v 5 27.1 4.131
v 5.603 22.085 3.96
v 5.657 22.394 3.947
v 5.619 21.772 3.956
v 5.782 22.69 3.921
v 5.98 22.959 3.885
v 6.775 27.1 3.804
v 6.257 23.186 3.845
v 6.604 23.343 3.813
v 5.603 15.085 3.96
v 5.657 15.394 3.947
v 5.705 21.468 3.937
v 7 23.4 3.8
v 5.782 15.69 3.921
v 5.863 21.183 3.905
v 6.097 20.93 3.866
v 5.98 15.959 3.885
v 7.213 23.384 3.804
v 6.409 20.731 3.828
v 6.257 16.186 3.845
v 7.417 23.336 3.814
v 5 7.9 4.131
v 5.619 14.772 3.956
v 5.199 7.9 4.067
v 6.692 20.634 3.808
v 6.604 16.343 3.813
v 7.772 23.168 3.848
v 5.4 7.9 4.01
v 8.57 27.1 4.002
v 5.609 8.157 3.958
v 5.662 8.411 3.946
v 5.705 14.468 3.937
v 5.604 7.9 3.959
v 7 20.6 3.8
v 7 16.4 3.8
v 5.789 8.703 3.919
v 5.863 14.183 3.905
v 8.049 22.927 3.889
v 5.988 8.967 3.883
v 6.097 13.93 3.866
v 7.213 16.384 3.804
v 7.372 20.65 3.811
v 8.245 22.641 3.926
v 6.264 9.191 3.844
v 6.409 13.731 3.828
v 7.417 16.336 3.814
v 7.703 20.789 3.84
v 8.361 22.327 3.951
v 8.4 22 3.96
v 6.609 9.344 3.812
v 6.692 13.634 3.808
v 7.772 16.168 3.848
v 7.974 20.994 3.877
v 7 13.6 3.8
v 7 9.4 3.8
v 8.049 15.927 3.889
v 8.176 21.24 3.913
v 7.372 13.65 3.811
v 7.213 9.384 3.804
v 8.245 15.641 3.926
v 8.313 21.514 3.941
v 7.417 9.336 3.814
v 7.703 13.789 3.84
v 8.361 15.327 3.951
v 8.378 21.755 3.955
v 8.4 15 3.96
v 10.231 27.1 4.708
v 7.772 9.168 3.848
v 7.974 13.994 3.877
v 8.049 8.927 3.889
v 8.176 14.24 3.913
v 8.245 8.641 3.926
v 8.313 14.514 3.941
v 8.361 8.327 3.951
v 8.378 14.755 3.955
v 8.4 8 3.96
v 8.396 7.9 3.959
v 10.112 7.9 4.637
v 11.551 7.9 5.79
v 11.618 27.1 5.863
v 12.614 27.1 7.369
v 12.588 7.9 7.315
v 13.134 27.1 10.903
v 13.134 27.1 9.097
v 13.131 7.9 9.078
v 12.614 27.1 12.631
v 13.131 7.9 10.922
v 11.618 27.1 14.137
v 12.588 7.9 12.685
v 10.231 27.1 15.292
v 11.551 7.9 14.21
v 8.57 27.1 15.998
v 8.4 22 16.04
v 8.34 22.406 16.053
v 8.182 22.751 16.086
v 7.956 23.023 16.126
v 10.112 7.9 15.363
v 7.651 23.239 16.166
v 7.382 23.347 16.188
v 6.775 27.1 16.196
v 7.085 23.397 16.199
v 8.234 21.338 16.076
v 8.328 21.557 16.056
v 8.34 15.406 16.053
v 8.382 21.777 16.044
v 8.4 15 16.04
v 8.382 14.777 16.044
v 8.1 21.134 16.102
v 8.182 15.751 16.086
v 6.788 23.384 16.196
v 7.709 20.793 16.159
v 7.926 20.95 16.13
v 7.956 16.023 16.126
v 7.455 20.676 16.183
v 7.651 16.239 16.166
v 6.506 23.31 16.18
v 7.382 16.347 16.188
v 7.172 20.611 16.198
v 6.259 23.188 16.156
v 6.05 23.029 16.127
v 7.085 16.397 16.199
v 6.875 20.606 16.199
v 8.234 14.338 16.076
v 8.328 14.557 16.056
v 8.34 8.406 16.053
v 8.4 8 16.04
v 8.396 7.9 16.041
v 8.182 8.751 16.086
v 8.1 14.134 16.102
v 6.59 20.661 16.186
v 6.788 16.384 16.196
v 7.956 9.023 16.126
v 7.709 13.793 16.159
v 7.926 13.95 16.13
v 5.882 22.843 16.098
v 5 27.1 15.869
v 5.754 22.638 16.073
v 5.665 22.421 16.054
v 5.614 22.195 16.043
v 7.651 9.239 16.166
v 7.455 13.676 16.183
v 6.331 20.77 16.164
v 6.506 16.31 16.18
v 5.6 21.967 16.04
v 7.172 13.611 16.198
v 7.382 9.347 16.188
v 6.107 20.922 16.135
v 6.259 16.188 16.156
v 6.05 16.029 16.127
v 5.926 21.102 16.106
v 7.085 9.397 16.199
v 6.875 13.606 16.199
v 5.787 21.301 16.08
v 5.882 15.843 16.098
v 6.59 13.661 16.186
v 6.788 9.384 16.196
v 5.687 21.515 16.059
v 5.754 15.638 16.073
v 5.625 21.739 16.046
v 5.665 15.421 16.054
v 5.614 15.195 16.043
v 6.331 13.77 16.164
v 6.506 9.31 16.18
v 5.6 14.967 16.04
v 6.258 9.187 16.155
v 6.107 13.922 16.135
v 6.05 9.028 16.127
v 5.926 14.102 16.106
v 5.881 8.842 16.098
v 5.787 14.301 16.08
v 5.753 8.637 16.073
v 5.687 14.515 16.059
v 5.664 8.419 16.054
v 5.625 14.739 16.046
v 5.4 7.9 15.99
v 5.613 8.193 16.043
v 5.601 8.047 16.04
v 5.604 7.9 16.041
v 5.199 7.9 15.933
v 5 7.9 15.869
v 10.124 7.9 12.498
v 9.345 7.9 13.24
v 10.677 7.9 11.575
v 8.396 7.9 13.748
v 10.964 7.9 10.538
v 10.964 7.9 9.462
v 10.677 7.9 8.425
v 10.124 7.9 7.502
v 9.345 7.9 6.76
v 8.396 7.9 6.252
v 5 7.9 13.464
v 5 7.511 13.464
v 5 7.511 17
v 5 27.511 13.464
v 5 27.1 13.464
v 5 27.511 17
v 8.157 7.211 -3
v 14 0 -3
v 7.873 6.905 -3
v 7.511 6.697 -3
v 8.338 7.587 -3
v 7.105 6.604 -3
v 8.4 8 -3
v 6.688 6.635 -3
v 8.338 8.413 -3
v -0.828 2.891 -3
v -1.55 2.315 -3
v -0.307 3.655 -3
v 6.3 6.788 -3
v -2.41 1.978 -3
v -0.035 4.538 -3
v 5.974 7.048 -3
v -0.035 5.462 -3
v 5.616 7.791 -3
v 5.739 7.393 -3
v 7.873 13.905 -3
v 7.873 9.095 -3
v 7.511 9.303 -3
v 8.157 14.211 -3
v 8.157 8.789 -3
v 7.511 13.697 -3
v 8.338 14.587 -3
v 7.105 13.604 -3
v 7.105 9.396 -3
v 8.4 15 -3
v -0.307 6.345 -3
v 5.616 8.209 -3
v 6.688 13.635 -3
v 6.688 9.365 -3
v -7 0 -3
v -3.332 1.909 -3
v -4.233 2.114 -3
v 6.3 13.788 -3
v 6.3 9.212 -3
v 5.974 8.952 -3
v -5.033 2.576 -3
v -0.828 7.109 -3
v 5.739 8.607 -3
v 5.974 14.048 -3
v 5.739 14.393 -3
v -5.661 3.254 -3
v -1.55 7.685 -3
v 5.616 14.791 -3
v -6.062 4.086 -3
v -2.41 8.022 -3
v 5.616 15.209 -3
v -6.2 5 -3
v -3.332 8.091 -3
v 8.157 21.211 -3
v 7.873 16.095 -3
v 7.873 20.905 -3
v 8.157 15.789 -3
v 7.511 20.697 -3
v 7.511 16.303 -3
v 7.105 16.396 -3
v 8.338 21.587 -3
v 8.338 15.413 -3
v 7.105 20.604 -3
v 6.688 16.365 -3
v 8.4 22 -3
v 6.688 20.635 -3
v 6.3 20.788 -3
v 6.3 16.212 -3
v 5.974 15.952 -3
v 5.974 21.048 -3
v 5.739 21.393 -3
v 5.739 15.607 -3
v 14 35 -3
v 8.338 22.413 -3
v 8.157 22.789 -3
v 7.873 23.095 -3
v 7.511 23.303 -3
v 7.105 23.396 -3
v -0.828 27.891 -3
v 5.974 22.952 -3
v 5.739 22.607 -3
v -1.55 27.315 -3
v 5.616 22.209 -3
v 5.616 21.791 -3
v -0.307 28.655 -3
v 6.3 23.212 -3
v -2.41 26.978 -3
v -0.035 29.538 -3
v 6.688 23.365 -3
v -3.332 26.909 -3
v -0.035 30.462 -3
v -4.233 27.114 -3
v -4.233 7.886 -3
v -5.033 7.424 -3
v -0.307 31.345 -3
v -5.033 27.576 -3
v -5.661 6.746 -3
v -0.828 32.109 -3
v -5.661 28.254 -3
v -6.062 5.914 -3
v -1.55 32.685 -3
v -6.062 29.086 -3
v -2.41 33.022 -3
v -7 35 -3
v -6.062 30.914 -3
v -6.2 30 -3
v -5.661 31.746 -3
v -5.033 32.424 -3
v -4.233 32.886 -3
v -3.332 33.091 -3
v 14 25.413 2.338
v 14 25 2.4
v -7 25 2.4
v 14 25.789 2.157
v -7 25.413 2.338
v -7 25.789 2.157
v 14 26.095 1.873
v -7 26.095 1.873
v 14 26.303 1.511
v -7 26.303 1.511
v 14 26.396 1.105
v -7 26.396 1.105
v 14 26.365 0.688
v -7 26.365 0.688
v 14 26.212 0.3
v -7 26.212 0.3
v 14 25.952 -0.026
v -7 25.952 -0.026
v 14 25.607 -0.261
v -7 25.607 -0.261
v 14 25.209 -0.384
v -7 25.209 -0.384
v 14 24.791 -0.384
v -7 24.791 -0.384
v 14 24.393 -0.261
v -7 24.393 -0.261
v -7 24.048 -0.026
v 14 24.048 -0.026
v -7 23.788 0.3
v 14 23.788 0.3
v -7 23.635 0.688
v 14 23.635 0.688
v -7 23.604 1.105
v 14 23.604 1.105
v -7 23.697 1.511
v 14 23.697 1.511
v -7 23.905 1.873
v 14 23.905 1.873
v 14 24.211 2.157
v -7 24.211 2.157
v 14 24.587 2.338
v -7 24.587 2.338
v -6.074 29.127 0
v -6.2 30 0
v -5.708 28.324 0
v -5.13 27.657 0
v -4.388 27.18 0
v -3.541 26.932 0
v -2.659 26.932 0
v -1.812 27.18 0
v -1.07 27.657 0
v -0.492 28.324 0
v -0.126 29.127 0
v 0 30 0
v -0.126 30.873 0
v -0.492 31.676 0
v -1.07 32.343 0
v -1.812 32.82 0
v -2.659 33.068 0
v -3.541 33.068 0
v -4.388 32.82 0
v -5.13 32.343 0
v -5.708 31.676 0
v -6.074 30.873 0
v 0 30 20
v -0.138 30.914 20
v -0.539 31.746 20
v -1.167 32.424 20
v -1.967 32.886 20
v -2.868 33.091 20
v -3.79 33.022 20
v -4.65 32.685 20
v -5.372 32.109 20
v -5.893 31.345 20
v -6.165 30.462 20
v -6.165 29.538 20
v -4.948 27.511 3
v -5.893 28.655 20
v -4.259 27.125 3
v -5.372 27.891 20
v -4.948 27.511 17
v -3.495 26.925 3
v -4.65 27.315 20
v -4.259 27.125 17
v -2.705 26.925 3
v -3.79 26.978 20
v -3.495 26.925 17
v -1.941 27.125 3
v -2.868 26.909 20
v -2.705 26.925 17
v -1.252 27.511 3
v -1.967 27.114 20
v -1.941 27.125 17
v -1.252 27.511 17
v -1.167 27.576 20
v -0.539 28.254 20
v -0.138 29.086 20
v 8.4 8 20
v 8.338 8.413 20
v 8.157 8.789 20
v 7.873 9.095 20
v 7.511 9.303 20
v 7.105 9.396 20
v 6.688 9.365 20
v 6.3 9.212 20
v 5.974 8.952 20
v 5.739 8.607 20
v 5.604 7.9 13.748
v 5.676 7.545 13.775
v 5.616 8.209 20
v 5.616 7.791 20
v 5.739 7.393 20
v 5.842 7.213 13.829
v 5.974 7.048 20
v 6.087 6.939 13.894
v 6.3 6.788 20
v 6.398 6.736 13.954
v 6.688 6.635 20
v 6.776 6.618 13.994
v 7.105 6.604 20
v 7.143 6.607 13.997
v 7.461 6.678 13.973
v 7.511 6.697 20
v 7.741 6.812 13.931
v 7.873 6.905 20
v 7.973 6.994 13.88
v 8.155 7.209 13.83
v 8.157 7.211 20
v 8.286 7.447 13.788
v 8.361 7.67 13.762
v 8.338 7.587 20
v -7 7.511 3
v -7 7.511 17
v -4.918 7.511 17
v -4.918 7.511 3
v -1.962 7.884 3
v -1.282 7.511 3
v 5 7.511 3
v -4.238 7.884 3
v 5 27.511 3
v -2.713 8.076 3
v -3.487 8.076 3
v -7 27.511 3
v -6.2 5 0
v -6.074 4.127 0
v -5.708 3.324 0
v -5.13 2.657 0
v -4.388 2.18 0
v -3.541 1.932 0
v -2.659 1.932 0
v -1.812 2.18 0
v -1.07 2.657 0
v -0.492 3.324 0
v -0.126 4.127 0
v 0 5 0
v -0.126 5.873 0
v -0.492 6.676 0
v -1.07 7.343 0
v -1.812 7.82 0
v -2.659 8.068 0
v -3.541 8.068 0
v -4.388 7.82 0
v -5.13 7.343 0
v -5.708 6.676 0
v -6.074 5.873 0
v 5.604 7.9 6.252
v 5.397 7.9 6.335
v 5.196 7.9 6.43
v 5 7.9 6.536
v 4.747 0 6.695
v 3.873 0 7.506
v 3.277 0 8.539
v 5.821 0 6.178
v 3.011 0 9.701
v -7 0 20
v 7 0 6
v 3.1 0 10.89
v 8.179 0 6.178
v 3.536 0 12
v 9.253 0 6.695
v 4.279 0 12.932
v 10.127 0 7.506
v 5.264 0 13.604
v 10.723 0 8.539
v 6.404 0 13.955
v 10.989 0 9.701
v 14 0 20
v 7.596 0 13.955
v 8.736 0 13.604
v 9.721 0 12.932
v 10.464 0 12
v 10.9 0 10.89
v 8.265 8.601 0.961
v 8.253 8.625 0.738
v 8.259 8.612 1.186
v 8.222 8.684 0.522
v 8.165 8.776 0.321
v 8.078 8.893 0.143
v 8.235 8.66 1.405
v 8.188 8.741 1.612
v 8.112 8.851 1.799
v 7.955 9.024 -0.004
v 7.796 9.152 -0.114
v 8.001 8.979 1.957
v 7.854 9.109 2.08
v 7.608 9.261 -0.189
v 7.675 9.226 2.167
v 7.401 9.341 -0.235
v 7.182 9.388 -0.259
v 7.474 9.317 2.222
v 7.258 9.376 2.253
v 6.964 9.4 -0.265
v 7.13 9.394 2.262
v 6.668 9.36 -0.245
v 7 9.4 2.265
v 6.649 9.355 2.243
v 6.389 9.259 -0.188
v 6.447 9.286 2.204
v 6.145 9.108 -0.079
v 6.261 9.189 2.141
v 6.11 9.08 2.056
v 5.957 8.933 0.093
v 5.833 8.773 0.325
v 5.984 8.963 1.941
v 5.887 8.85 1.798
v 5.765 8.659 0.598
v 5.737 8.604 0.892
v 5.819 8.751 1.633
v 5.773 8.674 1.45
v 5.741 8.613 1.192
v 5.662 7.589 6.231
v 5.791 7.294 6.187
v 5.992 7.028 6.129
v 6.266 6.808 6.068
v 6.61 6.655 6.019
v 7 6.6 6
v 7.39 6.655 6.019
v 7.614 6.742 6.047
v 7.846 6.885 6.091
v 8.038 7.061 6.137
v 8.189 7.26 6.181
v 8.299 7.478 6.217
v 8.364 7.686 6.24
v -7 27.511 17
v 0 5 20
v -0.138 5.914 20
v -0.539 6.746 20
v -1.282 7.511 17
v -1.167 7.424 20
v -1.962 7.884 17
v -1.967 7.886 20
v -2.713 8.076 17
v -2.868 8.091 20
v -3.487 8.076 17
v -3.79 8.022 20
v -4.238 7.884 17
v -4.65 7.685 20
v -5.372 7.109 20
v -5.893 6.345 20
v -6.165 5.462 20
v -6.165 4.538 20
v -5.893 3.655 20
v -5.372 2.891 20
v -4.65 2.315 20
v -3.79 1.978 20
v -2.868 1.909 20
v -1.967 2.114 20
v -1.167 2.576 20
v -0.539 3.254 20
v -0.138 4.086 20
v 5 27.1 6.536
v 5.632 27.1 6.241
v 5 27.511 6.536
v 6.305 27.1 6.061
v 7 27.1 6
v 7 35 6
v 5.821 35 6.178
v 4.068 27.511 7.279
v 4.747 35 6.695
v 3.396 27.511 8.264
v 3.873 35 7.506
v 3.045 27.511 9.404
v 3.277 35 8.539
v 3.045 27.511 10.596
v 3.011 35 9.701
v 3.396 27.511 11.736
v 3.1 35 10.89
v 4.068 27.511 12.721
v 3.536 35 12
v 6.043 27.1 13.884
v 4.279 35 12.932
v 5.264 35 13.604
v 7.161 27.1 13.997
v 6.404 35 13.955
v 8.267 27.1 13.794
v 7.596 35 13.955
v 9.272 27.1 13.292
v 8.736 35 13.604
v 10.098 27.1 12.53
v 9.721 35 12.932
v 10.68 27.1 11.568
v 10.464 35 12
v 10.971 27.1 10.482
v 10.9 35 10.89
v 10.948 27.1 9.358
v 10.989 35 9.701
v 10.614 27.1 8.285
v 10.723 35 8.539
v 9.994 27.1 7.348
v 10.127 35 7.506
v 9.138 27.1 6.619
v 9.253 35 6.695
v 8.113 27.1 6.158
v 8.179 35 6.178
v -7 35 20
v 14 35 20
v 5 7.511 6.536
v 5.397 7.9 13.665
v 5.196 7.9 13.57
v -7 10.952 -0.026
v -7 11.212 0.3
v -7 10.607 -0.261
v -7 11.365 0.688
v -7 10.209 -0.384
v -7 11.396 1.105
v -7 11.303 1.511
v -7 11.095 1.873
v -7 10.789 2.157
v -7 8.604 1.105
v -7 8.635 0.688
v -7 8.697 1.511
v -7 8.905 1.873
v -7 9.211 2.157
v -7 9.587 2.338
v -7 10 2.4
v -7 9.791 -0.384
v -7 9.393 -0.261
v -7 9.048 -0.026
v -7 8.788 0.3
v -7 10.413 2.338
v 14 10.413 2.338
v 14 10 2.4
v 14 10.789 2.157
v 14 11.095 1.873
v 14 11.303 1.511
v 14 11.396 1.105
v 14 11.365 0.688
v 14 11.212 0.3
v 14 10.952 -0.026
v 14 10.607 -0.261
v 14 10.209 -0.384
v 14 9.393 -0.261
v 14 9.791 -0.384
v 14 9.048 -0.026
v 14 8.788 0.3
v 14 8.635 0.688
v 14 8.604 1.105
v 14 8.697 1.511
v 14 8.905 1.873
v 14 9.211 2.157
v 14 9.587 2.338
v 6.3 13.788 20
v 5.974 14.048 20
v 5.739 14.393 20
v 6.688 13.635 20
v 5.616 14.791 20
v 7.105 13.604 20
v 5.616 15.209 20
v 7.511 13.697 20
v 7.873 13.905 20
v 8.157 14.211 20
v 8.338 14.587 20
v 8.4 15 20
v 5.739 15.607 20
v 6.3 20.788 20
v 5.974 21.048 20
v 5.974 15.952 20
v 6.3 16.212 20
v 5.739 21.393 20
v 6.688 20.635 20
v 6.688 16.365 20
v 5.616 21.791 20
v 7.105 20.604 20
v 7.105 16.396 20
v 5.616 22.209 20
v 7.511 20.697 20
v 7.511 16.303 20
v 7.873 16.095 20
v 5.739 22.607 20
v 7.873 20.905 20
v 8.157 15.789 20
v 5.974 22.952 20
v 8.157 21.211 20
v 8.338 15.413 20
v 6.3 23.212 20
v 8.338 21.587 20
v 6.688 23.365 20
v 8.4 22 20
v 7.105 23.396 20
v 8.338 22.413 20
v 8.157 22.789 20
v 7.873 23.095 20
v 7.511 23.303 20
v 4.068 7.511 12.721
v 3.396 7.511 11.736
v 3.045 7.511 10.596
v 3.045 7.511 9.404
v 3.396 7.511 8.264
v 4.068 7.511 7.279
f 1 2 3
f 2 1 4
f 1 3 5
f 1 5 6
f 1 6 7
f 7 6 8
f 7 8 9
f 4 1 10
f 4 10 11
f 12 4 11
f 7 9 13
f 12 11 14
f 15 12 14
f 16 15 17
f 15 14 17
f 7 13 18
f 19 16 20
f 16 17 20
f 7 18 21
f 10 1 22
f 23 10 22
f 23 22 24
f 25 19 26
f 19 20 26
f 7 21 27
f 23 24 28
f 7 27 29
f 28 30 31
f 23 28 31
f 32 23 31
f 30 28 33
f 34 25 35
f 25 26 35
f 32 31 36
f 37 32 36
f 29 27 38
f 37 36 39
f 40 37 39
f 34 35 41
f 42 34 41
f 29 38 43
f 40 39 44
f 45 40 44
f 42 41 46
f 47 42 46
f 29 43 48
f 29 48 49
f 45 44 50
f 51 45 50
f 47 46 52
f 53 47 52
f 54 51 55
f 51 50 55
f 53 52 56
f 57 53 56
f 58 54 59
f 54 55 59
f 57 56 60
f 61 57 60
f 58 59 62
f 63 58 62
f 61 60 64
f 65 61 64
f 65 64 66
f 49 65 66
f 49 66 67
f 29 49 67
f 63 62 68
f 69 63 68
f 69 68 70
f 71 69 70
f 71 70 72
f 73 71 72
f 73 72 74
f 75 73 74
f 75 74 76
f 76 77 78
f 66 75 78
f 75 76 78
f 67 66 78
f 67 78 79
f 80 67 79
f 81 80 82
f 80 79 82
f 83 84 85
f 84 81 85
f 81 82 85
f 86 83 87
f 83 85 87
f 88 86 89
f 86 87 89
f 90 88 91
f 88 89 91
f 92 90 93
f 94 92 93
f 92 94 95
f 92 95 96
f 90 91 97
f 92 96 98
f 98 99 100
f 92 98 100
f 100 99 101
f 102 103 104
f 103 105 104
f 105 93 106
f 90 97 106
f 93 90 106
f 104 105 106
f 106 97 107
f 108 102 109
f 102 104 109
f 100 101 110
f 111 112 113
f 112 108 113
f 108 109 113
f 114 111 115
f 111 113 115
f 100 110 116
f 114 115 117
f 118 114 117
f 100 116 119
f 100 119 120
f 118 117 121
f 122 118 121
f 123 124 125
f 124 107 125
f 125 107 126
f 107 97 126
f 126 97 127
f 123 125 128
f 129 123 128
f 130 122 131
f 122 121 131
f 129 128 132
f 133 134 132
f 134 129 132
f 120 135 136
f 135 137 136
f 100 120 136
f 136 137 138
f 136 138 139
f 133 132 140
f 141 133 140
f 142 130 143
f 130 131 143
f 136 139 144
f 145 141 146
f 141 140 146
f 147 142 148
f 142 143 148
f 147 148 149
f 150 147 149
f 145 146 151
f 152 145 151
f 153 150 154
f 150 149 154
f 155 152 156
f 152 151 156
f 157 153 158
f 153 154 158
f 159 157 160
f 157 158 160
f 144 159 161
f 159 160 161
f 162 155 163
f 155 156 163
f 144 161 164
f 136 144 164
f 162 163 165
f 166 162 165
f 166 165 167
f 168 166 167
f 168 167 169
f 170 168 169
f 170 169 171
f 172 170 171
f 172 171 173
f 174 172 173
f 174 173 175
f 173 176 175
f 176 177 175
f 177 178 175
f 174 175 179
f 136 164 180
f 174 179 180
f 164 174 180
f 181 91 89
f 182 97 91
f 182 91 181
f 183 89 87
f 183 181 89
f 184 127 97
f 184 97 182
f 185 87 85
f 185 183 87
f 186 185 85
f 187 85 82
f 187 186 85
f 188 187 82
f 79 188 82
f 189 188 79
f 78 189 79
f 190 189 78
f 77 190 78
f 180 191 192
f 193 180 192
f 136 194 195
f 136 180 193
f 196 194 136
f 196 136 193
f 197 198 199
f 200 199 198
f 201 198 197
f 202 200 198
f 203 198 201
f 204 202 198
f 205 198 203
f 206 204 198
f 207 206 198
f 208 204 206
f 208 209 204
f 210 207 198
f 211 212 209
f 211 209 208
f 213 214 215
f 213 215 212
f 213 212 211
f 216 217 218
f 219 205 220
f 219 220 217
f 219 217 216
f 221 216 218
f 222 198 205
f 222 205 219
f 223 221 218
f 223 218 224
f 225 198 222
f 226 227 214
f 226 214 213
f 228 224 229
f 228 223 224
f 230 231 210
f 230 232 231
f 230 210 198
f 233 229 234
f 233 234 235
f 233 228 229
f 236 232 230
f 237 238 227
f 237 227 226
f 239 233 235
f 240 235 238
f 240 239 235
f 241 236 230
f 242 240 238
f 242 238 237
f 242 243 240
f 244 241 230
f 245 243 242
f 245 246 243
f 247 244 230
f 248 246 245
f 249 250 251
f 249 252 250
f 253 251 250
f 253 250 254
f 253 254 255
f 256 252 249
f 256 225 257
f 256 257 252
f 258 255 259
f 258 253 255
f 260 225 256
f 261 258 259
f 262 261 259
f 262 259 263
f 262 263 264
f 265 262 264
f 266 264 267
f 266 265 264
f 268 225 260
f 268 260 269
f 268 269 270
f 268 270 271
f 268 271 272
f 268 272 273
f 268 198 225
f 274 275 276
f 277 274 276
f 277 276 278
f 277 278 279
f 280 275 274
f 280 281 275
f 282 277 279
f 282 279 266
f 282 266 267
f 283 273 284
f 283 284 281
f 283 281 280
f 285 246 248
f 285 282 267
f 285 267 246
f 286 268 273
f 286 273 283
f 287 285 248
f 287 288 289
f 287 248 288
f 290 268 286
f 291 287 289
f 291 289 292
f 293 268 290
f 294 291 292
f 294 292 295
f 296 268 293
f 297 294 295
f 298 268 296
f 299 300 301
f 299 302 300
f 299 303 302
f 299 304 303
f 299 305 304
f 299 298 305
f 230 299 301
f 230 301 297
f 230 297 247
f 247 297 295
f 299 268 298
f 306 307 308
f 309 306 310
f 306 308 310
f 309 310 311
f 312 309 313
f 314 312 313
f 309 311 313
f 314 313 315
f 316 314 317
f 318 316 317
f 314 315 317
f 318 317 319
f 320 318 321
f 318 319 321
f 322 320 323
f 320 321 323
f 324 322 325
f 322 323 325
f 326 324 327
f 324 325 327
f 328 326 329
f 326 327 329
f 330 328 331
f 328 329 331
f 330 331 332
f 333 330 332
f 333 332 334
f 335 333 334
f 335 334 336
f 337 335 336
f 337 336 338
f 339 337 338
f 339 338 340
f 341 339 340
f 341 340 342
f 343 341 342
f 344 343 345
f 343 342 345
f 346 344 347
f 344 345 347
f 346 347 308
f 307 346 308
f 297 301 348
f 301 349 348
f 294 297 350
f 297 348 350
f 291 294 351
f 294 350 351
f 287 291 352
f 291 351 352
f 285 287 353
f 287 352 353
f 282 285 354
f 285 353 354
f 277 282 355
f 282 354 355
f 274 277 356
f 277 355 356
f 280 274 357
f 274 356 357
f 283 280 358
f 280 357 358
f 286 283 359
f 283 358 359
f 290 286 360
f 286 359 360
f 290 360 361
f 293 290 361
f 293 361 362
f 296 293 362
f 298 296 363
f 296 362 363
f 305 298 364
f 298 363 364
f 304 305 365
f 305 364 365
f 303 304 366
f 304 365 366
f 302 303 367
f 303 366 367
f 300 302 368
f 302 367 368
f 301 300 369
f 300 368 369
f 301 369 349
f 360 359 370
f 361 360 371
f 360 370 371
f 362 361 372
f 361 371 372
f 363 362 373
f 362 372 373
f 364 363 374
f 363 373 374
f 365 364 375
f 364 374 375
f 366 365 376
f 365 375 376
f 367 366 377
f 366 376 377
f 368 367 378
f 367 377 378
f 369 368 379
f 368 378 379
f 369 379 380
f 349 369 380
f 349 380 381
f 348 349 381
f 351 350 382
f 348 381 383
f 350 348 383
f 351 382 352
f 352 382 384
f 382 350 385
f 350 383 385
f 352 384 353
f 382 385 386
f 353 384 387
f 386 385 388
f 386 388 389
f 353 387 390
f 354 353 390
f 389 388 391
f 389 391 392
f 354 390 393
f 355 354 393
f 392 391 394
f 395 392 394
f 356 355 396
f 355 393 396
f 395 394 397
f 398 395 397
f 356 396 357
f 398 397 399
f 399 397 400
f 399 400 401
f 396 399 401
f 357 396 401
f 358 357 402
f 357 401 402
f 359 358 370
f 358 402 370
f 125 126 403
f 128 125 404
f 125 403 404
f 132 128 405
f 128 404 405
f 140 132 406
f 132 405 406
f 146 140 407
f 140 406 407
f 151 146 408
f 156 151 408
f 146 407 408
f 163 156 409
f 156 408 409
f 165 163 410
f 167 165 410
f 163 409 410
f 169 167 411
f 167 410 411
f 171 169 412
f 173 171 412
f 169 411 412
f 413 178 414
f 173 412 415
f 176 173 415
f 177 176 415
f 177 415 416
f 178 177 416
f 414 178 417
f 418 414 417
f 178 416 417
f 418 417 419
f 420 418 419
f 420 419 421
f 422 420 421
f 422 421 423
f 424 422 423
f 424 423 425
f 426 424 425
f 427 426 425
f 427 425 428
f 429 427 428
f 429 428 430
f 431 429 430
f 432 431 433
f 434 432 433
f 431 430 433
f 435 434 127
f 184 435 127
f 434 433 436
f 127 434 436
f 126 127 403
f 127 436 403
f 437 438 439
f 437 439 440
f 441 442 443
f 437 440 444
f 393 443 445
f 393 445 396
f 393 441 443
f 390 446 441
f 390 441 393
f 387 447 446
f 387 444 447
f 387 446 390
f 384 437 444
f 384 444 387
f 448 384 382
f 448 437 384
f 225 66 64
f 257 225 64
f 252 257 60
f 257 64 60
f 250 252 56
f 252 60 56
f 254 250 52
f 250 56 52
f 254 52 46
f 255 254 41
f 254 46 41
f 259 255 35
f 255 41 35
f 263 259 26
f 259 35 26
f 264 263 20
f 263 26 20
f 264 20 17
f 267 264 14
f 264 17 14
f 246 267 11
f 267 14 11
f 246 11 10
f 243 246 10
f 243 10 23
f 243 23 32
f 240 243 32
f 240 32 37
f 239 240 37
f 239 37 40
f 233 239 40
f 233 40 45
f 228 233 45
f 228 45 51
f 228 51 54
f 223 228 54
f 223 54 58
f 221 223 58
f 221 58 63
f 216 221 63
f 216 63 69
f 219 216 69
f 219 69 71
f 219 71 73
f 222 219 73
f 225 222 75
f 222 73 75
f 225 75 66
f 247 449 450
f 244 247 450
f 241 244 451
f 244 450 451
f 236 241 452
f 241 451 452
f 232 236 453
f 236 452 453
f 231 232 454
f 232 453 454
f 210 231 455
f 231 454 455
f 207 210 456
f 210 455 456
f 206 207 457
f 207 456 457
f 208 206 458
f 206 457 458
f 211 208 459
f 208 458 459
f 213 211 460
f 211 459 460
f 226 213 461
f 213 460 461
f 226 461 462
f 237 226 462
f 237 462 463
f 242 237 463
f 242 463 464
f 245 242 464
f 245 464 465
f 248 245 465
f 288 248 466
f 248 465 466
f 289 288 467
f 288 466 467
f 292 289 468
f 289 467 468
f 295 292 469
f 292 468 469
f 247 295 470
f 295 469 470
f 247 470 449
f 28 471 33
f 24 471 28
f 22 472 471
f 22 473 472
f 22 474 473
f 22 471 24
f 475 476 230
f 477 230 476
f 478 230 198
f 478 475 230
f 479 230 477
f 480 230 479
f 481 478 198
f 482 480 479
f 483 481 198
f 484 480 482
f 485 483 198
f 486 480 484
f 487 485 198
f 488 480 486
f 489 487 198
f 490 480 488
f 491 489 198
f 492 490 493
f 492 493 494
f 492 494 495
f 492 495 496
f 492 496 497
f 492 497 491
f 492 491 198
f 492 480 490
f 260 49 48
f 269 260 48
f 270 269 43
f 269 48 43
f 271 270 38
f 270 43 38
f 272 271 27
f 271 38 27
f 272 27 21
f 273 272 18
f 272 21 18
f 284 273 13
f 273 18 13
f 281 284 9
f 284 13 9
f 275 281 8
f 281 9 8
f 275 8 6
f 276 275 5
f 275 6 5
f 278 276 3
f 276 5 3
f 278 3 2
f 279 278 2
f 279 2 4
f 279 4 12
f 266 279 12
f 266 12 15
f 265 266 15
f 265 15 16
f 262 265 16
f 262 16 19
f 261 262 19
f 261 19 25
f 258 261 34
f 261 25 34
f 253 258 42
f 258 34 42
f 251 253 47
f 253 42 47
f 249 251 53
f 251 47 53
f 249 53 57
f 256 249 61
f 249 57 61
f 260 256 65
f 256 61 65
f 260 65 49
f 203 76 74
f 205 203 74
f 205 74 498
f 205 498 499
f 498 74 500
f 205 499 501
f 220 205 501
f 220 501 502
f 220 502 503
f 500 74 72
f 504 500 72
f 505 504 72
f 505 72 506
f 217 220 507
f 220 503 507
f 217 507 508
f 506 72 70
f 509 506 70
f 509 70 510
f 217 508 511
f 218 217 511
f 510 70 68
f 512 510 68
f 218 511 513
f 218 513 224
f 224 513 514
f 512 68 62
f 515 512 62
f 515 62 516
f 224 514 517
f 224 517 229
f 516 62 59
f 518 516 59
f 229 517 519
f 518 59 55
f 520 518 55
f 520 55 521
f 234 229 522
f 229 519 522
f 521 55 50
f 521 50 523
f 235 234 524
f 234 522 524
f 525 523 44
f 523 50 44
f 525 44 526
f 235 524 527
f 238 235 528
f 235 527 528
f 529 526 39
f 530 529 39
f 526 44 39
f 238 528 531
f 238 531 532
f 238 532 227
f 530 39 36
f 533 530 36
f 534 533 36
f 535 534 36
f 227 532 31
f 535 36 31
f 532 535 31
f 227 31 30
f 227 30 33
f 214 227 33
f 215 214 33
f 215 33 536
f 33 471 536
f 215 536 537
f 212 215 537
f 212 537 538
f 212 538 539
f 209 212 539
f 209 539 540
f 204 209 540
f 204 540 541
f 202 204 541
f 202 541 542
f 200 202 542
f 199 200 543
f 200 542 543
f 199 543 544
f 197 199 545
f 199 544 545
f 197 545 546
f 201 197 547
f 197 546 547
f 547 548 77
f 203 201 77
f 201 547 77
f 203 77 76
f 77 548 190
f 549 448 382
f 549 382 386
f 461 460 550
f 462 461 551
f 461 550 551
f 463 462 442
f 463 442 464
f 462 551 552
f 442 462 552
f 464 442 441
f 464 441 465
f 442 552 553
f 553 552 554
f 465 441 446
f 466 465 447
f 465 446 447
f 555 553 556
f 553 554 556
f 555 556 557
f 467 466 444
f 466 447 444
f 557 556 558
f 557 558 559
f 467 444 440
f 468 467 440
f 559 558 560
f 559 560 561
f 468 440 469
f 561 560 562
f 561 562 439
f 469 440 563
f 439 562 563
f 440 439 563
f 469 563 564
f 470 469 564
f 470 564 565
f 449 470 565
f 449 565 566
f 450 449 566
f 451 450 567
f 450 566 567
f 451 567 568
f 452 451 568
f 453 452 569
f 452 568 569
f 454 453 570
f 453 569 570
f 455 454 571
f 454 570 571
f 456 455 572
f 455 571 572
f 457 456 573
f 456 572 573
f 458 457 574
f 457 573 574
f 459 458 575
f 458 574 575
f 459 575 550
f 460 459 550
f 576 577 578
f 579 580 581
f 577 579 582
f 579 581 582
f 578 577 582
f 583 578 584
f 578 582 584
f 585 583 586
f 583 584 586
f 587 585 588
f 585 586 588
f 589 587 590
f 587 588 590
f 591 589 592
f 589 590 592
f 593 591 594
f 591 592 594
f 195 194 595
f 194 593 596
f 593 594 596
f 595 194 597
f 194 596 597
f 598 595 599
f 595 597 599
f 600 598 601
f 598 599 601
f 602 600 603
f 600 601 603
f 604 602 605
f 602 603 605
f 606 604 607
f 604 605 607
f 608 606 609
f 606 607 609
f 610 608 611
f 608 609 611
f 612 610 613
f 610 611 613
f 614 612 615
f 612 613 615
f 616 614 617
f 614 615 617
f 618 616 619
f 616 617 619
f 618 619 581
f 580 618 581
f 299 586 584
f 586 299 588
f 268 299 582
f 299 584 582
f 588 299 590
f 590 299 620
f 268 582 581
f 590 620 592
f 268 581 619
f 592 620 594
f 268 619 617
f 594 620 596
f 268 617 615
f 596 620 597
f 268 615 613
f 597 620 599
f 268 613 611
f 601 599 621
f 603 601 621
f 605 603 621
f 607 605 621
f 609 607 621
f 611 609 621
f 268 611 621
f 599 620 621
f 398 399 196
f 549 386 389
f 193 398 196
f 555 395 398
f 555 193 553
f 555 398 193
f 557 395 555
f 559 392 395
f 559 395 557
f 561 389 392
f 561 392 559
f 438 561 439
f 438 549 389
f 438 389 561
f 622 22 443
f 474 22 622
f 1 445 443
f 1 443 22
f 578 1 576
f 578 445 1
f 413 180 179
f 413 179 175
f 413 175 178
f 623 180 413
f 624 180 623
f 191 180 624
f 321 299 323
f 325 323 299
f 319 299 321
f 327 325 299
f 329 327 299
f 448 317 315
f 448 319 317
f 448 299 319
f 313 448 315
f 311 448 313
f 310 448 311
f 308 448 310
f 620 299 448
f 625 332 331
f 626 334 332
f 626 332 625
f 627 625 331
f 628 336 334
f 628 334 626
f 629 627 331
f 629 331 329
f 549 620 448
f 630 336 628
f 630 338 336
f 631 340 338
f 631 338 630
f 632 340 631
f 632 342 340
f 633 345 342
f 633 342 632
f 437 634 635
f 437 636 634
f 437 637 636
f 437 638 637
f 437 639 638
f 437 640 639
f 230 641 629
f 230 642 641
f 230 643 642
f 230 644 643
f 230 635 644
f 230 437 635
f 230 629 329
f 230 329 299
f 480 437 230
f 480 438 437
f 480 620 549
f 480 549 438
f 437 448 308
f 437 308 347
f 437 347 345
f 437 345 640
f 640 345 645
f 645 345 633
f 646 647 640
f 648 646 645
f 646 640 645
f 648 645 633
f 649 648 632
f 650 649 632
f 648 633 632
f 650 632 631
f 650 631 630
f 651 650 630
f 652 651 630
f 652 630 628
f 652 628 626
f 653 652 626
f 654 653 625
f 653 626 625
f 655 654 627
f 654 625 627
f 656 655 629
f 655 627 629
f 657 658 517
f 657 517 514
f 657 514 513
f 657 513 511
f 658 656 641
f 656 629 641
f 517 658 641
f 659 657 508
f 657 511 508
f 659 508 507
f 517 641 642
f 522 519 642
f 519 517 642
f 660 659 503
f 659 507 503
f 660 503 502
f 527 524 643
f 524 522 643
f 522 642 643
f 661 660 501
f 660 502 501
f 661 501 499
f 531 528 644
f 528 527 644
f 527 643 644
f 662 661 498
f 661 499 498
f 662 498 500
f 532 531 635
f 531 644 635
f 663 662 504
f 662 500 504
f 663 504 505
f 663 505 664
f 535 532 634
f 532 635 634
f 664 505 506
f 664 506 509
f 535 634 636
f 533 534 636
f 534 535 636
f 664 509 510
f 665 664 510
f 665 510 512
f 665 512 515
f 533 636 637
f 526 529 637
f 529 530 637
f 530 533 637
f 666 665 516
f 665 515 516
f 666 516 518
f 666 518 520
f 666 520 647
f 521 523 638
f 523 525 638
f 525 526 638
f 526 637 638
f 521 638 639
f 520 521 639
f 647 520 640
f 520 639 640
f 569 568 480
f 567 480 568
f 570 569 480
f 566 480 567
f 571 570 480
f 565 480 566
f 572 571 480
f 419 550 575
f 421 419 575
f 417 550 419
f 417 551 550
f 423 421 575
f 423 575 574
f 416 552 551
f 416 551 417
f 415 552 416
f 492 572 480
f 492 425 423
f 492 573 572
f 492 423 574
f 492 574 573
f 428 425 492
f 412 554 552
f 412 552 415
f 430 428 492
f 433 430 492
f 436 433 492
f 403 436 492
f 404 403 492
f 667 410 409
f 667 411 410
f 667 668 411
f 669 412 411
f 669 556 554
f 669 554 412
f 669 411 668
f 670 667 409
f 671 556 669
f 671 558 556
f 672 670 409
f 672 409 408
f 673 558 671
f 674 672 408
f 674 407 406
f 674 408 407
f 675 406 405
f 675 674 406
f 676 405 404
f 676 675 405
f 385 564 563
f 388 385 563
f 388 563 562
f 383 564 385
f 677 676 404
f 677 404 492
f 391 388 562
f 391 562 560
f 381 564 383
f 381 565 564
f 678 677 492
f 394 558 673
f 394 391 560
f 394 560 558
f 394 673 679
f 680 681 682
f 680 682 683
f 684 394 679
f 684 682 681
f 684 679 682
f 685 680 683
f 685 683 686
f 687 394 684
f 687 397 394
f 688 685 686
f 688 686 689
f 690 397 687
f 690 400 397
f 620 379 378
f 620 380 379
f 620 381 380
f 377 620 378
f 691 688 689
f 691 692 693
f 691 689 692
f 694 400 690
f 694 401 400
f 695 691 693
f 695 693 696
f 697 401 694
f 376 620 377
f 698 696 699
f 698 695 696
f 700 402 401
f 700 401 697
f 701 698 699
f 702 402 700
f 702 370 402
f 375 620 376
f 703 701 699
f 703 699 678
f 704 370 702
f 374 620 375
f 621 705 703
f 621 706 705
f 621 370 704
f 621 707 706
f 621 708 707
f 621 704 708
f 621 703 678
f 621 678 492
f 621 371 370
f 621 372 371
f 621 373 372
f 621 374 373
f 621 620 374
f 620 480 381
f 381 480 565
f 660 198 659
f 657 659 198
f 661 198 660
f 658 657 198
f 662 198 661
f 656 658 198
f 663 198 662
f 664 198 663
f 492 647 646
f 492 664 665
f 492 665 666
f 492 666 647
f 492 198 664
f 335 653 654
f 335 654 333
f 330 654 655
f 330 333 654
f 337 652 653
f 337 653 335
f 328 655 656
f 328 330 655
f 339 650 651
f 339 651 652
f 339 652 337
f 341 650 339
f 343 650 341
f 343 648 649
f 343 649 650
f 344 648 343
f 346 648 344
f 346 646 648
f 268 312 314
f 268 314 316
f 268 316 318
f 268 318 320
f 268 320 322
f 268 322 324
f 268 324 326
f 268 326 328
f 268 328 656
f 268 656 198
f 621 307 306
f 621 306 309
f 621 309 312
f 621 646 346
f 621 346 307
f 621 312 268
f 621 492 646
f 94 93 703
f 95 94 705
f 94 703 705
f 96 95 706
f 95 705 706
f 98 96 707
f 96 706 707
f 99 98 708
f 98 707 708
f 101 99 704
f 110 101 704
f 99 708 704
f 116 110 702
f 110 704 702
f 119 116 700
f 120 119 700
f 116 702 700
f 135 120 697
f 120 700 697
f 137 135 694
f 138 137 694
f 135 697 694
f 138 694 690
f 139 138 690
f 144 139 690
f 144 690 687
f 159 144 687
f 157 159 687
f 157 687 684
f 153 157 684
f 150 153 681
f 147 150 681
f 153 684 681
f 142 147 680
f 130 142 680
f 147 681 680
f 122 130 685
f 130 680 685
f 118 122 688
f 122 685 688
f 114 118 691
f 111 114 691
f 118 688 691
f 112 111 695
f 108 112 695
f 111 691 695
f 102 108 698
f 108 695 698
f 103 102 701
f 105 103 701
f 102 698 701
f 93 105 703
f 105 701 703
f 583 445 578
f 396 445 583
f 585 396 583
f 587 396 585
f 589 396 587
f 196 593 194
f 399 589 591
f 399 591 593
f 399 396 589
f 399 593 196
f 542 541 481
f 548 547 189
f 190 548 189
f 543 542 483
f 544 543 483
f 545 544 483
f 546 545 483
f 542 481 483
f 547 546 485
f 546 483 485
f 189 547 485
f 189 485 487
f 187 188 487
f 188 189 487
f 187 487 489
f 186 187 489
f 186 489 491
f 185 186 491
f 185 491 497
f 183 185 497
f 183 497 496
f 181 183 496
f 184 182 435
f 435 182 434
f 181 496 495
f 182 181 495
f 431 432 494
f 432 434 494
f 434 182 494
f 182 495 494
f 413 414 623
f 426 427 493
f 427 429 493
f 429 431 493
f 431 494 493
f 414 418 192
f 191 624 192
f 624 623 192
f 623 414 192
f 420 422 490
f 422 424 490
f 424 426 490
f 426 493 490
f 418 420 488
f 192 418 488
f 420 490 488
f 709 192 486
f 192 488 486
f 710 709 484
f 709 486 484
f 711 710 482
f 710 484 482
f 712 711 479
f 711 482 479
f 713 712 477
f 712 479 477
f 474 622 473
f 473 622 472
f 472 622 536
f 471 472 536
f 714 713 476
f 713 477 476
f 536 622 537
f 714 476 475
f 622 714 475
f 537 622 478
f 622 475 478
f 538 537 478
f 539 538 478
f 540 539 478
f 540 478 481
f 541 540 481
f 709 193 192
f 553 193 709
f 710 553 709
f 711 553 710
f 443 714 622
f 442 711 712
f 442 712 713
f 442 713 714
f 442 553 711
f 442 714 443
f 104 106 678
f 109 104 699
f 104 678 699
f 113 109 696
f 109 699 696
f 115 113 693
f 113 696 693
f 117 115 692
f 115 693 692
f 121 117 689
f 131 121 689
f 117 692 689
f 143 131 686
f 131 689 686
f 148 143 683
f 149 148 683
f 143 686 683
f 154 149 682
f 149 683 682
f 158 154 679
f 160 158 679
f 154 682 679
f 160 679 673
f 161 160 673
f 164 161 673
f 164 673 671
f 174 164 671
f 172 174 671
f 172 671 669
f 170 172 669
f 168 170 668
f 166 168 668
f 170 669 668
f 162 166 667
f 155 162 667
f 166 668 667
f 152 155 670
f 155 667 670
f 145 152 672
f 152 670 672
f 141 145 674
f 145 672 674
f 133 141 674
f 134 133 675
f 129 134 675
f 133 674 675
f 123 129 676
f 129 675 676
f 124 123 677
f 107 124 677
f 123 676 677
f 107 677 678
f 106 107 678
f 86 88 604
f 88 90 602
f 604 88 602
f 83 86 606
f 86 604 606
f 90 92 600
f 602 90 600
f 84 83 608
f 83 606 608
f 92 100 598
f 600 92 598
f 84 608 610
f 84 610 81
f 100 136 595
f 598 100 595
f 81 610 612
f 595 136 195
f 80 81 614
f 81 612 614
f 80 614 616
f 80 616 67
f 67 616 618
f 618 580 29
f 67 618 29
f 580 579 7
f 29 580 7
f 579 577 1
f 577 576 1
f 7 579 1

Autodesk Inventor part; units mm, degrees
ref_plane "YZ Plane" through (0, 0, 0) normal (1, 0, 0) x (0, 1, 0)
ref_plane "XZ Plane" through (0, 0, 0) normal (0, 1, 0) x (-1, 0, 0)
sketch "Sketch1" plane through (0, 0, 0) normal (1, 0, 0) x (0, 1, 0)
  line L0 (0, 0) -> (35, 0)
  line L1 (35, 0) -> (35, 20)
  line L2 (35, 20) -> (0, 20)
  line L3 (0, 20) -> (0, 0)
  dimension "d0" = 35
  dimension "d1" = 20
extrude "Extrusion1" add sketch "Sketch1" along normal blind 14
ref_plane "Work Plane1" through (7, 0, 0) normal (-1, 0, 0) x (0, 0, 1)
sketch "Sketch2" plane through (7, 0, 0) normal (-1, 0, 0) x (0, 0, 1)
  line L0 (20, 0) -> (0, 0) projected
  line L1 (10, 0) -> (10, 35)
  line L2 (0, 35) -> (20, 35) projected
  line L3 (3.8, 7.9) -> (16.2, 7.9)
  line L4 (16.2, 7.9) -> (16.2, 27.1)
  line L5 (16.2, 27.1) -> (3.8, 27.1)
  line L6 (3.8, 27.1) -> (3.8, 7.9)
  line L7 (3.8, 7.9) -> (16.2, 27.1) construction
  line L8 (16.2, 7.9) -> (3.8, 27.1) construction
  line L9 (10, 7.9) -> (6, 7.9)
  line L10 (6, 7.9) -> (6, 0)
  line L11 (6, 0) -> (10, 0)
  line L12 (10, 0) -> (10, 7.9)
  line L13 (10, 27.1) -> (6, 27.1)
  line L14 (6, 27.1) -> (6, 35)
  line L15 (6, 35) -> (10, 35)
  line L16 (10, 35) -> (10, 27.1)
  line L17 (10, 27.1) -> (3.8, 27.1)
  line L18 (3.8, 27.1) -> (3.8, 7.9)
  line L19 (3.8, 7.9) -> (10, 7.9)
  line L20 (10, 7.9) -> (10, 27.1)
  point P0 (10, 17.5)
  dimension "d5" = 12.4
  dimension "d6" = 19.2
  dimension "d7" = 4
revolve "Revolution1" cut sketch "Sketch2" angle 360 about axis through (7, 0, 10) along (0, 1, 0) contours L0 L10 L3 L1 | L3 L6 L5 L1 | L5 L14 L2 L1
sketch "Sketch3" plane through (0, 0, 20) normal (0, 0, 1) x (1, 0, 0)
  line L0 (0, 35) -> (0, 0) projected
  line L1 (0, 0) -> (14, 0) projected
  line L2 (14, 35) -> (14, 0) projected
  line L3 (0, 35) -> (14, 35) projected
  line L4 (0, 0) -> (0, 35) projected
  line L5 (0, 0) -> (-7, 0)
  line L6 (-7, 0) -> (-7, 35)
  line L7 (-7, 35) -> (0, 35)
  line L8 (0, 35) -> (0, 0)
  line L9 (0, 35) -> (14, 35) projected
  circle A0 centre (-3.1, 5) radius 3.1
  line L10 (0, 35) -> (0, 0) projected
  circle A1 centre (-3.1, 30) radius 3.1
  dimension "d9" = 7
  dimension "d10" = 6.2
  dimension "d11" = 6.2
  dimension "d12" = 5
  dimension "d13" = 5
extrude "Extrusion2" add sketch "Sketch3" against normal up to surface (20 mm away) contours L0 L5 L6 L7
sketch "Sketch4" plane through (-7, 0, 20) normal (-1, 0, 0) x (0, 0, 1)
  line L0 (-16.2, 27.1) -> (-16.2, 7.9) projected
  line L1 (-15, 24.5) -> (-5, 24.5) projected
  line L2 (-14, 27.1) -> (-6, 27.1) projected
  line L3 (-16.2, 7.9) -> (-3.8, 7.9) projected
  line L4 (-3.8, 27.1) -> (-3.8, 7.9) projected
  line L5 (-16.2, 27.1) -> (-3.8, 27.1) projected
  line L6 (-17, 27.5113) -> (-3, 27.5113)
  line L7 (-3, 27.5113) -> (-3, 7.5113)
  line L8 (-3, 7.5113) -> (-17, 7.5113)
  line L9 (-17, 7.5113) -> (-17, 27.5113)
  line L10 (-17, 27.5113) -> (-3, 7.5113) construction
  line L11 (-3, 27.5113) -> (-17, 7.5113) construction
  line L12 (-13.5, 32.7798) -> (-6.5, 32.7798)
  line L13 (-6.5, 32.7798) -> (-6.5, 27.5113)
  line L14 (-6.5, 27.5113) -> (-13.5, 27.5113)
  line L15 (-13.5, 27.5113) -> (-13.5, 32.7798)
  line L16 (-13.5, 32.7798) -> (-6.5, 27.5113) construction
  line L17 (-6.5, 32.7798) -> (-13.5, 27.5113) construction
  line L18 (-13.5, 1.8013) -> (-6.5, 1.8013)
  line L19 (-6.5, 1.8013) -> (-6.5, 7.5113)
  line L20 (-6.5, 7.5113) -> (-13.5, 7.5113)
  line L21 (-13.5, 7.5113) -> (-13.5, 1.8013)
  line L22 (-13.5, 1.8013) -> (-6.5, 7.5113) construction
  line L23 (-6.5, 1.8013) -> (-13.5, 7.5113) construction
  line L24 (0, 35) -> (-20, 35) projected
  line L25 (-13.5, 32.7798) -> (-6.5, 32.7798)
  line L26 (-6.5, 32.7798) -> (-6.5, 35)
  line L27 (-6.5, 35) -> (-13.5, 35)
  line L28 (-13.5, 35) -> (-13.5, 32.7798)
  line L29 (-6, 0) -> (-14, 0) projected
  line L30 (-13.5, 1.8013) -> (-6, 1.8013)
  line L31 (-6, 1.8013) -> (-6, 0)
  line L32 (-6, 0) -> (-13.5, 0)
  line L33 (-13.5, 0) -> (-13.5, 1.8013)
  point P0 (-20, 0)
  point P1 (-10, 17.5113)
  point P2 (-10, 30.1456)
  point P3 (-10, 4.6563)
  dimension "d16" = 14
  dimension "d17" = 20
  dimension "d18" = 7
  dimension "d41" = 7
extrude "Extrusion3" cut sketch "Sketch4" against normal blind 12 contours L5 L2 L4 L3 L0 | L6 L7 L8 L9
sketch "Sketch5" plane through (14, 0, 0) normal (0, 0, -1) x (-1, 0, 0)
  line L0 (21, 35) -> (0, 35) projected
  line L1 (0, 0) -> (0, 35) projected
  line L2 (21, 0) -> (0, 0) projected
  line L3 (21, 35) -> (21, 0) projected
  circle A0 centre (17.1, 30) radius 3.1 projected
  circle A1 centre (17.1, 5) radius 3.1 projected
  point P0 (14, 0)
ref_plane "Work Plane2" through (-3.5, -134.0004, -5) normal (0, 0, -1) x (0, 1, 0)
extrude "Extrusion4" add sketch "Sketch5" along normal blind 3
sketch "Sketch6" plane through (-7, 0, 20) normal (-1, 0, 0) x (0, 0, 1)
  point P0 (-20, 0)
sketch "Sketch7" plane through (-7, 0, 20) normal (-1, 0, 0) x (0, 0, 1)
  line L0 (-3, 7.5113) -> (-17, 7.5113) projected
  line L1 (-17, 7.5113) -> (-17, 27.5113) projected
  line L2 (-17, 27.5113) -> (-3, 27.5113) projected
  line L3 (-3, 27.5113) -> (-3, 7.5113) projected
  line L4 (0, 0) -> (-23, 0) projected
  line L5 (0, 35) -> (0, 0) projected
  line L6 (0, 35) -> (-23, 35) projected
  line L7 (-23, 0) -> (-23, 35) projected
  circle A0 centre (-19, 10) radius 1.4
  circle A1 centre (-19, 25) radius 1.4
  point P0 (-20, 0)
  dimension "d23" = 2.8
  dimension "d24" = 2.8
  dimension "d25" = 10
  dimension "d26" = 10
  dimension "d27" = 4
  dimension "d36" = 4
extrude "Extrusion5" cut sketch "Sketch7" against normal through all contours A0 | A1
sketch "Sketch8" plane through (14, 0, 20) normal (0, 0, 1) x (1, 0, 0)
  line L0 (-10, 99.8613) -> (-10, -100.1387)
  line L1 (-4, 99.8613) -> (-4, -100.1387)
  circle A0 centre (-7, 15) radius 1.4
  line L2 (-21, 0) -> (0, 0) projected
  circle A1 centre (-7, 8) radius 1.4
  circle A2 centre (-7, 22) radius 1.4
  point P0 (-14, 0)
  dimension "d31" = 2.8
  dimension "d32" = 15
  dimension "d33" = 3
  dimension "d37" = 2.8
  dimension "d38" = 2.8
  dimension "d39" = 7
  dimension "d40" = 7
extrude "Extrusion6" cut sketch "Sketch8" against normal through all
properties part number "30_CUBE_openXY_slider"
